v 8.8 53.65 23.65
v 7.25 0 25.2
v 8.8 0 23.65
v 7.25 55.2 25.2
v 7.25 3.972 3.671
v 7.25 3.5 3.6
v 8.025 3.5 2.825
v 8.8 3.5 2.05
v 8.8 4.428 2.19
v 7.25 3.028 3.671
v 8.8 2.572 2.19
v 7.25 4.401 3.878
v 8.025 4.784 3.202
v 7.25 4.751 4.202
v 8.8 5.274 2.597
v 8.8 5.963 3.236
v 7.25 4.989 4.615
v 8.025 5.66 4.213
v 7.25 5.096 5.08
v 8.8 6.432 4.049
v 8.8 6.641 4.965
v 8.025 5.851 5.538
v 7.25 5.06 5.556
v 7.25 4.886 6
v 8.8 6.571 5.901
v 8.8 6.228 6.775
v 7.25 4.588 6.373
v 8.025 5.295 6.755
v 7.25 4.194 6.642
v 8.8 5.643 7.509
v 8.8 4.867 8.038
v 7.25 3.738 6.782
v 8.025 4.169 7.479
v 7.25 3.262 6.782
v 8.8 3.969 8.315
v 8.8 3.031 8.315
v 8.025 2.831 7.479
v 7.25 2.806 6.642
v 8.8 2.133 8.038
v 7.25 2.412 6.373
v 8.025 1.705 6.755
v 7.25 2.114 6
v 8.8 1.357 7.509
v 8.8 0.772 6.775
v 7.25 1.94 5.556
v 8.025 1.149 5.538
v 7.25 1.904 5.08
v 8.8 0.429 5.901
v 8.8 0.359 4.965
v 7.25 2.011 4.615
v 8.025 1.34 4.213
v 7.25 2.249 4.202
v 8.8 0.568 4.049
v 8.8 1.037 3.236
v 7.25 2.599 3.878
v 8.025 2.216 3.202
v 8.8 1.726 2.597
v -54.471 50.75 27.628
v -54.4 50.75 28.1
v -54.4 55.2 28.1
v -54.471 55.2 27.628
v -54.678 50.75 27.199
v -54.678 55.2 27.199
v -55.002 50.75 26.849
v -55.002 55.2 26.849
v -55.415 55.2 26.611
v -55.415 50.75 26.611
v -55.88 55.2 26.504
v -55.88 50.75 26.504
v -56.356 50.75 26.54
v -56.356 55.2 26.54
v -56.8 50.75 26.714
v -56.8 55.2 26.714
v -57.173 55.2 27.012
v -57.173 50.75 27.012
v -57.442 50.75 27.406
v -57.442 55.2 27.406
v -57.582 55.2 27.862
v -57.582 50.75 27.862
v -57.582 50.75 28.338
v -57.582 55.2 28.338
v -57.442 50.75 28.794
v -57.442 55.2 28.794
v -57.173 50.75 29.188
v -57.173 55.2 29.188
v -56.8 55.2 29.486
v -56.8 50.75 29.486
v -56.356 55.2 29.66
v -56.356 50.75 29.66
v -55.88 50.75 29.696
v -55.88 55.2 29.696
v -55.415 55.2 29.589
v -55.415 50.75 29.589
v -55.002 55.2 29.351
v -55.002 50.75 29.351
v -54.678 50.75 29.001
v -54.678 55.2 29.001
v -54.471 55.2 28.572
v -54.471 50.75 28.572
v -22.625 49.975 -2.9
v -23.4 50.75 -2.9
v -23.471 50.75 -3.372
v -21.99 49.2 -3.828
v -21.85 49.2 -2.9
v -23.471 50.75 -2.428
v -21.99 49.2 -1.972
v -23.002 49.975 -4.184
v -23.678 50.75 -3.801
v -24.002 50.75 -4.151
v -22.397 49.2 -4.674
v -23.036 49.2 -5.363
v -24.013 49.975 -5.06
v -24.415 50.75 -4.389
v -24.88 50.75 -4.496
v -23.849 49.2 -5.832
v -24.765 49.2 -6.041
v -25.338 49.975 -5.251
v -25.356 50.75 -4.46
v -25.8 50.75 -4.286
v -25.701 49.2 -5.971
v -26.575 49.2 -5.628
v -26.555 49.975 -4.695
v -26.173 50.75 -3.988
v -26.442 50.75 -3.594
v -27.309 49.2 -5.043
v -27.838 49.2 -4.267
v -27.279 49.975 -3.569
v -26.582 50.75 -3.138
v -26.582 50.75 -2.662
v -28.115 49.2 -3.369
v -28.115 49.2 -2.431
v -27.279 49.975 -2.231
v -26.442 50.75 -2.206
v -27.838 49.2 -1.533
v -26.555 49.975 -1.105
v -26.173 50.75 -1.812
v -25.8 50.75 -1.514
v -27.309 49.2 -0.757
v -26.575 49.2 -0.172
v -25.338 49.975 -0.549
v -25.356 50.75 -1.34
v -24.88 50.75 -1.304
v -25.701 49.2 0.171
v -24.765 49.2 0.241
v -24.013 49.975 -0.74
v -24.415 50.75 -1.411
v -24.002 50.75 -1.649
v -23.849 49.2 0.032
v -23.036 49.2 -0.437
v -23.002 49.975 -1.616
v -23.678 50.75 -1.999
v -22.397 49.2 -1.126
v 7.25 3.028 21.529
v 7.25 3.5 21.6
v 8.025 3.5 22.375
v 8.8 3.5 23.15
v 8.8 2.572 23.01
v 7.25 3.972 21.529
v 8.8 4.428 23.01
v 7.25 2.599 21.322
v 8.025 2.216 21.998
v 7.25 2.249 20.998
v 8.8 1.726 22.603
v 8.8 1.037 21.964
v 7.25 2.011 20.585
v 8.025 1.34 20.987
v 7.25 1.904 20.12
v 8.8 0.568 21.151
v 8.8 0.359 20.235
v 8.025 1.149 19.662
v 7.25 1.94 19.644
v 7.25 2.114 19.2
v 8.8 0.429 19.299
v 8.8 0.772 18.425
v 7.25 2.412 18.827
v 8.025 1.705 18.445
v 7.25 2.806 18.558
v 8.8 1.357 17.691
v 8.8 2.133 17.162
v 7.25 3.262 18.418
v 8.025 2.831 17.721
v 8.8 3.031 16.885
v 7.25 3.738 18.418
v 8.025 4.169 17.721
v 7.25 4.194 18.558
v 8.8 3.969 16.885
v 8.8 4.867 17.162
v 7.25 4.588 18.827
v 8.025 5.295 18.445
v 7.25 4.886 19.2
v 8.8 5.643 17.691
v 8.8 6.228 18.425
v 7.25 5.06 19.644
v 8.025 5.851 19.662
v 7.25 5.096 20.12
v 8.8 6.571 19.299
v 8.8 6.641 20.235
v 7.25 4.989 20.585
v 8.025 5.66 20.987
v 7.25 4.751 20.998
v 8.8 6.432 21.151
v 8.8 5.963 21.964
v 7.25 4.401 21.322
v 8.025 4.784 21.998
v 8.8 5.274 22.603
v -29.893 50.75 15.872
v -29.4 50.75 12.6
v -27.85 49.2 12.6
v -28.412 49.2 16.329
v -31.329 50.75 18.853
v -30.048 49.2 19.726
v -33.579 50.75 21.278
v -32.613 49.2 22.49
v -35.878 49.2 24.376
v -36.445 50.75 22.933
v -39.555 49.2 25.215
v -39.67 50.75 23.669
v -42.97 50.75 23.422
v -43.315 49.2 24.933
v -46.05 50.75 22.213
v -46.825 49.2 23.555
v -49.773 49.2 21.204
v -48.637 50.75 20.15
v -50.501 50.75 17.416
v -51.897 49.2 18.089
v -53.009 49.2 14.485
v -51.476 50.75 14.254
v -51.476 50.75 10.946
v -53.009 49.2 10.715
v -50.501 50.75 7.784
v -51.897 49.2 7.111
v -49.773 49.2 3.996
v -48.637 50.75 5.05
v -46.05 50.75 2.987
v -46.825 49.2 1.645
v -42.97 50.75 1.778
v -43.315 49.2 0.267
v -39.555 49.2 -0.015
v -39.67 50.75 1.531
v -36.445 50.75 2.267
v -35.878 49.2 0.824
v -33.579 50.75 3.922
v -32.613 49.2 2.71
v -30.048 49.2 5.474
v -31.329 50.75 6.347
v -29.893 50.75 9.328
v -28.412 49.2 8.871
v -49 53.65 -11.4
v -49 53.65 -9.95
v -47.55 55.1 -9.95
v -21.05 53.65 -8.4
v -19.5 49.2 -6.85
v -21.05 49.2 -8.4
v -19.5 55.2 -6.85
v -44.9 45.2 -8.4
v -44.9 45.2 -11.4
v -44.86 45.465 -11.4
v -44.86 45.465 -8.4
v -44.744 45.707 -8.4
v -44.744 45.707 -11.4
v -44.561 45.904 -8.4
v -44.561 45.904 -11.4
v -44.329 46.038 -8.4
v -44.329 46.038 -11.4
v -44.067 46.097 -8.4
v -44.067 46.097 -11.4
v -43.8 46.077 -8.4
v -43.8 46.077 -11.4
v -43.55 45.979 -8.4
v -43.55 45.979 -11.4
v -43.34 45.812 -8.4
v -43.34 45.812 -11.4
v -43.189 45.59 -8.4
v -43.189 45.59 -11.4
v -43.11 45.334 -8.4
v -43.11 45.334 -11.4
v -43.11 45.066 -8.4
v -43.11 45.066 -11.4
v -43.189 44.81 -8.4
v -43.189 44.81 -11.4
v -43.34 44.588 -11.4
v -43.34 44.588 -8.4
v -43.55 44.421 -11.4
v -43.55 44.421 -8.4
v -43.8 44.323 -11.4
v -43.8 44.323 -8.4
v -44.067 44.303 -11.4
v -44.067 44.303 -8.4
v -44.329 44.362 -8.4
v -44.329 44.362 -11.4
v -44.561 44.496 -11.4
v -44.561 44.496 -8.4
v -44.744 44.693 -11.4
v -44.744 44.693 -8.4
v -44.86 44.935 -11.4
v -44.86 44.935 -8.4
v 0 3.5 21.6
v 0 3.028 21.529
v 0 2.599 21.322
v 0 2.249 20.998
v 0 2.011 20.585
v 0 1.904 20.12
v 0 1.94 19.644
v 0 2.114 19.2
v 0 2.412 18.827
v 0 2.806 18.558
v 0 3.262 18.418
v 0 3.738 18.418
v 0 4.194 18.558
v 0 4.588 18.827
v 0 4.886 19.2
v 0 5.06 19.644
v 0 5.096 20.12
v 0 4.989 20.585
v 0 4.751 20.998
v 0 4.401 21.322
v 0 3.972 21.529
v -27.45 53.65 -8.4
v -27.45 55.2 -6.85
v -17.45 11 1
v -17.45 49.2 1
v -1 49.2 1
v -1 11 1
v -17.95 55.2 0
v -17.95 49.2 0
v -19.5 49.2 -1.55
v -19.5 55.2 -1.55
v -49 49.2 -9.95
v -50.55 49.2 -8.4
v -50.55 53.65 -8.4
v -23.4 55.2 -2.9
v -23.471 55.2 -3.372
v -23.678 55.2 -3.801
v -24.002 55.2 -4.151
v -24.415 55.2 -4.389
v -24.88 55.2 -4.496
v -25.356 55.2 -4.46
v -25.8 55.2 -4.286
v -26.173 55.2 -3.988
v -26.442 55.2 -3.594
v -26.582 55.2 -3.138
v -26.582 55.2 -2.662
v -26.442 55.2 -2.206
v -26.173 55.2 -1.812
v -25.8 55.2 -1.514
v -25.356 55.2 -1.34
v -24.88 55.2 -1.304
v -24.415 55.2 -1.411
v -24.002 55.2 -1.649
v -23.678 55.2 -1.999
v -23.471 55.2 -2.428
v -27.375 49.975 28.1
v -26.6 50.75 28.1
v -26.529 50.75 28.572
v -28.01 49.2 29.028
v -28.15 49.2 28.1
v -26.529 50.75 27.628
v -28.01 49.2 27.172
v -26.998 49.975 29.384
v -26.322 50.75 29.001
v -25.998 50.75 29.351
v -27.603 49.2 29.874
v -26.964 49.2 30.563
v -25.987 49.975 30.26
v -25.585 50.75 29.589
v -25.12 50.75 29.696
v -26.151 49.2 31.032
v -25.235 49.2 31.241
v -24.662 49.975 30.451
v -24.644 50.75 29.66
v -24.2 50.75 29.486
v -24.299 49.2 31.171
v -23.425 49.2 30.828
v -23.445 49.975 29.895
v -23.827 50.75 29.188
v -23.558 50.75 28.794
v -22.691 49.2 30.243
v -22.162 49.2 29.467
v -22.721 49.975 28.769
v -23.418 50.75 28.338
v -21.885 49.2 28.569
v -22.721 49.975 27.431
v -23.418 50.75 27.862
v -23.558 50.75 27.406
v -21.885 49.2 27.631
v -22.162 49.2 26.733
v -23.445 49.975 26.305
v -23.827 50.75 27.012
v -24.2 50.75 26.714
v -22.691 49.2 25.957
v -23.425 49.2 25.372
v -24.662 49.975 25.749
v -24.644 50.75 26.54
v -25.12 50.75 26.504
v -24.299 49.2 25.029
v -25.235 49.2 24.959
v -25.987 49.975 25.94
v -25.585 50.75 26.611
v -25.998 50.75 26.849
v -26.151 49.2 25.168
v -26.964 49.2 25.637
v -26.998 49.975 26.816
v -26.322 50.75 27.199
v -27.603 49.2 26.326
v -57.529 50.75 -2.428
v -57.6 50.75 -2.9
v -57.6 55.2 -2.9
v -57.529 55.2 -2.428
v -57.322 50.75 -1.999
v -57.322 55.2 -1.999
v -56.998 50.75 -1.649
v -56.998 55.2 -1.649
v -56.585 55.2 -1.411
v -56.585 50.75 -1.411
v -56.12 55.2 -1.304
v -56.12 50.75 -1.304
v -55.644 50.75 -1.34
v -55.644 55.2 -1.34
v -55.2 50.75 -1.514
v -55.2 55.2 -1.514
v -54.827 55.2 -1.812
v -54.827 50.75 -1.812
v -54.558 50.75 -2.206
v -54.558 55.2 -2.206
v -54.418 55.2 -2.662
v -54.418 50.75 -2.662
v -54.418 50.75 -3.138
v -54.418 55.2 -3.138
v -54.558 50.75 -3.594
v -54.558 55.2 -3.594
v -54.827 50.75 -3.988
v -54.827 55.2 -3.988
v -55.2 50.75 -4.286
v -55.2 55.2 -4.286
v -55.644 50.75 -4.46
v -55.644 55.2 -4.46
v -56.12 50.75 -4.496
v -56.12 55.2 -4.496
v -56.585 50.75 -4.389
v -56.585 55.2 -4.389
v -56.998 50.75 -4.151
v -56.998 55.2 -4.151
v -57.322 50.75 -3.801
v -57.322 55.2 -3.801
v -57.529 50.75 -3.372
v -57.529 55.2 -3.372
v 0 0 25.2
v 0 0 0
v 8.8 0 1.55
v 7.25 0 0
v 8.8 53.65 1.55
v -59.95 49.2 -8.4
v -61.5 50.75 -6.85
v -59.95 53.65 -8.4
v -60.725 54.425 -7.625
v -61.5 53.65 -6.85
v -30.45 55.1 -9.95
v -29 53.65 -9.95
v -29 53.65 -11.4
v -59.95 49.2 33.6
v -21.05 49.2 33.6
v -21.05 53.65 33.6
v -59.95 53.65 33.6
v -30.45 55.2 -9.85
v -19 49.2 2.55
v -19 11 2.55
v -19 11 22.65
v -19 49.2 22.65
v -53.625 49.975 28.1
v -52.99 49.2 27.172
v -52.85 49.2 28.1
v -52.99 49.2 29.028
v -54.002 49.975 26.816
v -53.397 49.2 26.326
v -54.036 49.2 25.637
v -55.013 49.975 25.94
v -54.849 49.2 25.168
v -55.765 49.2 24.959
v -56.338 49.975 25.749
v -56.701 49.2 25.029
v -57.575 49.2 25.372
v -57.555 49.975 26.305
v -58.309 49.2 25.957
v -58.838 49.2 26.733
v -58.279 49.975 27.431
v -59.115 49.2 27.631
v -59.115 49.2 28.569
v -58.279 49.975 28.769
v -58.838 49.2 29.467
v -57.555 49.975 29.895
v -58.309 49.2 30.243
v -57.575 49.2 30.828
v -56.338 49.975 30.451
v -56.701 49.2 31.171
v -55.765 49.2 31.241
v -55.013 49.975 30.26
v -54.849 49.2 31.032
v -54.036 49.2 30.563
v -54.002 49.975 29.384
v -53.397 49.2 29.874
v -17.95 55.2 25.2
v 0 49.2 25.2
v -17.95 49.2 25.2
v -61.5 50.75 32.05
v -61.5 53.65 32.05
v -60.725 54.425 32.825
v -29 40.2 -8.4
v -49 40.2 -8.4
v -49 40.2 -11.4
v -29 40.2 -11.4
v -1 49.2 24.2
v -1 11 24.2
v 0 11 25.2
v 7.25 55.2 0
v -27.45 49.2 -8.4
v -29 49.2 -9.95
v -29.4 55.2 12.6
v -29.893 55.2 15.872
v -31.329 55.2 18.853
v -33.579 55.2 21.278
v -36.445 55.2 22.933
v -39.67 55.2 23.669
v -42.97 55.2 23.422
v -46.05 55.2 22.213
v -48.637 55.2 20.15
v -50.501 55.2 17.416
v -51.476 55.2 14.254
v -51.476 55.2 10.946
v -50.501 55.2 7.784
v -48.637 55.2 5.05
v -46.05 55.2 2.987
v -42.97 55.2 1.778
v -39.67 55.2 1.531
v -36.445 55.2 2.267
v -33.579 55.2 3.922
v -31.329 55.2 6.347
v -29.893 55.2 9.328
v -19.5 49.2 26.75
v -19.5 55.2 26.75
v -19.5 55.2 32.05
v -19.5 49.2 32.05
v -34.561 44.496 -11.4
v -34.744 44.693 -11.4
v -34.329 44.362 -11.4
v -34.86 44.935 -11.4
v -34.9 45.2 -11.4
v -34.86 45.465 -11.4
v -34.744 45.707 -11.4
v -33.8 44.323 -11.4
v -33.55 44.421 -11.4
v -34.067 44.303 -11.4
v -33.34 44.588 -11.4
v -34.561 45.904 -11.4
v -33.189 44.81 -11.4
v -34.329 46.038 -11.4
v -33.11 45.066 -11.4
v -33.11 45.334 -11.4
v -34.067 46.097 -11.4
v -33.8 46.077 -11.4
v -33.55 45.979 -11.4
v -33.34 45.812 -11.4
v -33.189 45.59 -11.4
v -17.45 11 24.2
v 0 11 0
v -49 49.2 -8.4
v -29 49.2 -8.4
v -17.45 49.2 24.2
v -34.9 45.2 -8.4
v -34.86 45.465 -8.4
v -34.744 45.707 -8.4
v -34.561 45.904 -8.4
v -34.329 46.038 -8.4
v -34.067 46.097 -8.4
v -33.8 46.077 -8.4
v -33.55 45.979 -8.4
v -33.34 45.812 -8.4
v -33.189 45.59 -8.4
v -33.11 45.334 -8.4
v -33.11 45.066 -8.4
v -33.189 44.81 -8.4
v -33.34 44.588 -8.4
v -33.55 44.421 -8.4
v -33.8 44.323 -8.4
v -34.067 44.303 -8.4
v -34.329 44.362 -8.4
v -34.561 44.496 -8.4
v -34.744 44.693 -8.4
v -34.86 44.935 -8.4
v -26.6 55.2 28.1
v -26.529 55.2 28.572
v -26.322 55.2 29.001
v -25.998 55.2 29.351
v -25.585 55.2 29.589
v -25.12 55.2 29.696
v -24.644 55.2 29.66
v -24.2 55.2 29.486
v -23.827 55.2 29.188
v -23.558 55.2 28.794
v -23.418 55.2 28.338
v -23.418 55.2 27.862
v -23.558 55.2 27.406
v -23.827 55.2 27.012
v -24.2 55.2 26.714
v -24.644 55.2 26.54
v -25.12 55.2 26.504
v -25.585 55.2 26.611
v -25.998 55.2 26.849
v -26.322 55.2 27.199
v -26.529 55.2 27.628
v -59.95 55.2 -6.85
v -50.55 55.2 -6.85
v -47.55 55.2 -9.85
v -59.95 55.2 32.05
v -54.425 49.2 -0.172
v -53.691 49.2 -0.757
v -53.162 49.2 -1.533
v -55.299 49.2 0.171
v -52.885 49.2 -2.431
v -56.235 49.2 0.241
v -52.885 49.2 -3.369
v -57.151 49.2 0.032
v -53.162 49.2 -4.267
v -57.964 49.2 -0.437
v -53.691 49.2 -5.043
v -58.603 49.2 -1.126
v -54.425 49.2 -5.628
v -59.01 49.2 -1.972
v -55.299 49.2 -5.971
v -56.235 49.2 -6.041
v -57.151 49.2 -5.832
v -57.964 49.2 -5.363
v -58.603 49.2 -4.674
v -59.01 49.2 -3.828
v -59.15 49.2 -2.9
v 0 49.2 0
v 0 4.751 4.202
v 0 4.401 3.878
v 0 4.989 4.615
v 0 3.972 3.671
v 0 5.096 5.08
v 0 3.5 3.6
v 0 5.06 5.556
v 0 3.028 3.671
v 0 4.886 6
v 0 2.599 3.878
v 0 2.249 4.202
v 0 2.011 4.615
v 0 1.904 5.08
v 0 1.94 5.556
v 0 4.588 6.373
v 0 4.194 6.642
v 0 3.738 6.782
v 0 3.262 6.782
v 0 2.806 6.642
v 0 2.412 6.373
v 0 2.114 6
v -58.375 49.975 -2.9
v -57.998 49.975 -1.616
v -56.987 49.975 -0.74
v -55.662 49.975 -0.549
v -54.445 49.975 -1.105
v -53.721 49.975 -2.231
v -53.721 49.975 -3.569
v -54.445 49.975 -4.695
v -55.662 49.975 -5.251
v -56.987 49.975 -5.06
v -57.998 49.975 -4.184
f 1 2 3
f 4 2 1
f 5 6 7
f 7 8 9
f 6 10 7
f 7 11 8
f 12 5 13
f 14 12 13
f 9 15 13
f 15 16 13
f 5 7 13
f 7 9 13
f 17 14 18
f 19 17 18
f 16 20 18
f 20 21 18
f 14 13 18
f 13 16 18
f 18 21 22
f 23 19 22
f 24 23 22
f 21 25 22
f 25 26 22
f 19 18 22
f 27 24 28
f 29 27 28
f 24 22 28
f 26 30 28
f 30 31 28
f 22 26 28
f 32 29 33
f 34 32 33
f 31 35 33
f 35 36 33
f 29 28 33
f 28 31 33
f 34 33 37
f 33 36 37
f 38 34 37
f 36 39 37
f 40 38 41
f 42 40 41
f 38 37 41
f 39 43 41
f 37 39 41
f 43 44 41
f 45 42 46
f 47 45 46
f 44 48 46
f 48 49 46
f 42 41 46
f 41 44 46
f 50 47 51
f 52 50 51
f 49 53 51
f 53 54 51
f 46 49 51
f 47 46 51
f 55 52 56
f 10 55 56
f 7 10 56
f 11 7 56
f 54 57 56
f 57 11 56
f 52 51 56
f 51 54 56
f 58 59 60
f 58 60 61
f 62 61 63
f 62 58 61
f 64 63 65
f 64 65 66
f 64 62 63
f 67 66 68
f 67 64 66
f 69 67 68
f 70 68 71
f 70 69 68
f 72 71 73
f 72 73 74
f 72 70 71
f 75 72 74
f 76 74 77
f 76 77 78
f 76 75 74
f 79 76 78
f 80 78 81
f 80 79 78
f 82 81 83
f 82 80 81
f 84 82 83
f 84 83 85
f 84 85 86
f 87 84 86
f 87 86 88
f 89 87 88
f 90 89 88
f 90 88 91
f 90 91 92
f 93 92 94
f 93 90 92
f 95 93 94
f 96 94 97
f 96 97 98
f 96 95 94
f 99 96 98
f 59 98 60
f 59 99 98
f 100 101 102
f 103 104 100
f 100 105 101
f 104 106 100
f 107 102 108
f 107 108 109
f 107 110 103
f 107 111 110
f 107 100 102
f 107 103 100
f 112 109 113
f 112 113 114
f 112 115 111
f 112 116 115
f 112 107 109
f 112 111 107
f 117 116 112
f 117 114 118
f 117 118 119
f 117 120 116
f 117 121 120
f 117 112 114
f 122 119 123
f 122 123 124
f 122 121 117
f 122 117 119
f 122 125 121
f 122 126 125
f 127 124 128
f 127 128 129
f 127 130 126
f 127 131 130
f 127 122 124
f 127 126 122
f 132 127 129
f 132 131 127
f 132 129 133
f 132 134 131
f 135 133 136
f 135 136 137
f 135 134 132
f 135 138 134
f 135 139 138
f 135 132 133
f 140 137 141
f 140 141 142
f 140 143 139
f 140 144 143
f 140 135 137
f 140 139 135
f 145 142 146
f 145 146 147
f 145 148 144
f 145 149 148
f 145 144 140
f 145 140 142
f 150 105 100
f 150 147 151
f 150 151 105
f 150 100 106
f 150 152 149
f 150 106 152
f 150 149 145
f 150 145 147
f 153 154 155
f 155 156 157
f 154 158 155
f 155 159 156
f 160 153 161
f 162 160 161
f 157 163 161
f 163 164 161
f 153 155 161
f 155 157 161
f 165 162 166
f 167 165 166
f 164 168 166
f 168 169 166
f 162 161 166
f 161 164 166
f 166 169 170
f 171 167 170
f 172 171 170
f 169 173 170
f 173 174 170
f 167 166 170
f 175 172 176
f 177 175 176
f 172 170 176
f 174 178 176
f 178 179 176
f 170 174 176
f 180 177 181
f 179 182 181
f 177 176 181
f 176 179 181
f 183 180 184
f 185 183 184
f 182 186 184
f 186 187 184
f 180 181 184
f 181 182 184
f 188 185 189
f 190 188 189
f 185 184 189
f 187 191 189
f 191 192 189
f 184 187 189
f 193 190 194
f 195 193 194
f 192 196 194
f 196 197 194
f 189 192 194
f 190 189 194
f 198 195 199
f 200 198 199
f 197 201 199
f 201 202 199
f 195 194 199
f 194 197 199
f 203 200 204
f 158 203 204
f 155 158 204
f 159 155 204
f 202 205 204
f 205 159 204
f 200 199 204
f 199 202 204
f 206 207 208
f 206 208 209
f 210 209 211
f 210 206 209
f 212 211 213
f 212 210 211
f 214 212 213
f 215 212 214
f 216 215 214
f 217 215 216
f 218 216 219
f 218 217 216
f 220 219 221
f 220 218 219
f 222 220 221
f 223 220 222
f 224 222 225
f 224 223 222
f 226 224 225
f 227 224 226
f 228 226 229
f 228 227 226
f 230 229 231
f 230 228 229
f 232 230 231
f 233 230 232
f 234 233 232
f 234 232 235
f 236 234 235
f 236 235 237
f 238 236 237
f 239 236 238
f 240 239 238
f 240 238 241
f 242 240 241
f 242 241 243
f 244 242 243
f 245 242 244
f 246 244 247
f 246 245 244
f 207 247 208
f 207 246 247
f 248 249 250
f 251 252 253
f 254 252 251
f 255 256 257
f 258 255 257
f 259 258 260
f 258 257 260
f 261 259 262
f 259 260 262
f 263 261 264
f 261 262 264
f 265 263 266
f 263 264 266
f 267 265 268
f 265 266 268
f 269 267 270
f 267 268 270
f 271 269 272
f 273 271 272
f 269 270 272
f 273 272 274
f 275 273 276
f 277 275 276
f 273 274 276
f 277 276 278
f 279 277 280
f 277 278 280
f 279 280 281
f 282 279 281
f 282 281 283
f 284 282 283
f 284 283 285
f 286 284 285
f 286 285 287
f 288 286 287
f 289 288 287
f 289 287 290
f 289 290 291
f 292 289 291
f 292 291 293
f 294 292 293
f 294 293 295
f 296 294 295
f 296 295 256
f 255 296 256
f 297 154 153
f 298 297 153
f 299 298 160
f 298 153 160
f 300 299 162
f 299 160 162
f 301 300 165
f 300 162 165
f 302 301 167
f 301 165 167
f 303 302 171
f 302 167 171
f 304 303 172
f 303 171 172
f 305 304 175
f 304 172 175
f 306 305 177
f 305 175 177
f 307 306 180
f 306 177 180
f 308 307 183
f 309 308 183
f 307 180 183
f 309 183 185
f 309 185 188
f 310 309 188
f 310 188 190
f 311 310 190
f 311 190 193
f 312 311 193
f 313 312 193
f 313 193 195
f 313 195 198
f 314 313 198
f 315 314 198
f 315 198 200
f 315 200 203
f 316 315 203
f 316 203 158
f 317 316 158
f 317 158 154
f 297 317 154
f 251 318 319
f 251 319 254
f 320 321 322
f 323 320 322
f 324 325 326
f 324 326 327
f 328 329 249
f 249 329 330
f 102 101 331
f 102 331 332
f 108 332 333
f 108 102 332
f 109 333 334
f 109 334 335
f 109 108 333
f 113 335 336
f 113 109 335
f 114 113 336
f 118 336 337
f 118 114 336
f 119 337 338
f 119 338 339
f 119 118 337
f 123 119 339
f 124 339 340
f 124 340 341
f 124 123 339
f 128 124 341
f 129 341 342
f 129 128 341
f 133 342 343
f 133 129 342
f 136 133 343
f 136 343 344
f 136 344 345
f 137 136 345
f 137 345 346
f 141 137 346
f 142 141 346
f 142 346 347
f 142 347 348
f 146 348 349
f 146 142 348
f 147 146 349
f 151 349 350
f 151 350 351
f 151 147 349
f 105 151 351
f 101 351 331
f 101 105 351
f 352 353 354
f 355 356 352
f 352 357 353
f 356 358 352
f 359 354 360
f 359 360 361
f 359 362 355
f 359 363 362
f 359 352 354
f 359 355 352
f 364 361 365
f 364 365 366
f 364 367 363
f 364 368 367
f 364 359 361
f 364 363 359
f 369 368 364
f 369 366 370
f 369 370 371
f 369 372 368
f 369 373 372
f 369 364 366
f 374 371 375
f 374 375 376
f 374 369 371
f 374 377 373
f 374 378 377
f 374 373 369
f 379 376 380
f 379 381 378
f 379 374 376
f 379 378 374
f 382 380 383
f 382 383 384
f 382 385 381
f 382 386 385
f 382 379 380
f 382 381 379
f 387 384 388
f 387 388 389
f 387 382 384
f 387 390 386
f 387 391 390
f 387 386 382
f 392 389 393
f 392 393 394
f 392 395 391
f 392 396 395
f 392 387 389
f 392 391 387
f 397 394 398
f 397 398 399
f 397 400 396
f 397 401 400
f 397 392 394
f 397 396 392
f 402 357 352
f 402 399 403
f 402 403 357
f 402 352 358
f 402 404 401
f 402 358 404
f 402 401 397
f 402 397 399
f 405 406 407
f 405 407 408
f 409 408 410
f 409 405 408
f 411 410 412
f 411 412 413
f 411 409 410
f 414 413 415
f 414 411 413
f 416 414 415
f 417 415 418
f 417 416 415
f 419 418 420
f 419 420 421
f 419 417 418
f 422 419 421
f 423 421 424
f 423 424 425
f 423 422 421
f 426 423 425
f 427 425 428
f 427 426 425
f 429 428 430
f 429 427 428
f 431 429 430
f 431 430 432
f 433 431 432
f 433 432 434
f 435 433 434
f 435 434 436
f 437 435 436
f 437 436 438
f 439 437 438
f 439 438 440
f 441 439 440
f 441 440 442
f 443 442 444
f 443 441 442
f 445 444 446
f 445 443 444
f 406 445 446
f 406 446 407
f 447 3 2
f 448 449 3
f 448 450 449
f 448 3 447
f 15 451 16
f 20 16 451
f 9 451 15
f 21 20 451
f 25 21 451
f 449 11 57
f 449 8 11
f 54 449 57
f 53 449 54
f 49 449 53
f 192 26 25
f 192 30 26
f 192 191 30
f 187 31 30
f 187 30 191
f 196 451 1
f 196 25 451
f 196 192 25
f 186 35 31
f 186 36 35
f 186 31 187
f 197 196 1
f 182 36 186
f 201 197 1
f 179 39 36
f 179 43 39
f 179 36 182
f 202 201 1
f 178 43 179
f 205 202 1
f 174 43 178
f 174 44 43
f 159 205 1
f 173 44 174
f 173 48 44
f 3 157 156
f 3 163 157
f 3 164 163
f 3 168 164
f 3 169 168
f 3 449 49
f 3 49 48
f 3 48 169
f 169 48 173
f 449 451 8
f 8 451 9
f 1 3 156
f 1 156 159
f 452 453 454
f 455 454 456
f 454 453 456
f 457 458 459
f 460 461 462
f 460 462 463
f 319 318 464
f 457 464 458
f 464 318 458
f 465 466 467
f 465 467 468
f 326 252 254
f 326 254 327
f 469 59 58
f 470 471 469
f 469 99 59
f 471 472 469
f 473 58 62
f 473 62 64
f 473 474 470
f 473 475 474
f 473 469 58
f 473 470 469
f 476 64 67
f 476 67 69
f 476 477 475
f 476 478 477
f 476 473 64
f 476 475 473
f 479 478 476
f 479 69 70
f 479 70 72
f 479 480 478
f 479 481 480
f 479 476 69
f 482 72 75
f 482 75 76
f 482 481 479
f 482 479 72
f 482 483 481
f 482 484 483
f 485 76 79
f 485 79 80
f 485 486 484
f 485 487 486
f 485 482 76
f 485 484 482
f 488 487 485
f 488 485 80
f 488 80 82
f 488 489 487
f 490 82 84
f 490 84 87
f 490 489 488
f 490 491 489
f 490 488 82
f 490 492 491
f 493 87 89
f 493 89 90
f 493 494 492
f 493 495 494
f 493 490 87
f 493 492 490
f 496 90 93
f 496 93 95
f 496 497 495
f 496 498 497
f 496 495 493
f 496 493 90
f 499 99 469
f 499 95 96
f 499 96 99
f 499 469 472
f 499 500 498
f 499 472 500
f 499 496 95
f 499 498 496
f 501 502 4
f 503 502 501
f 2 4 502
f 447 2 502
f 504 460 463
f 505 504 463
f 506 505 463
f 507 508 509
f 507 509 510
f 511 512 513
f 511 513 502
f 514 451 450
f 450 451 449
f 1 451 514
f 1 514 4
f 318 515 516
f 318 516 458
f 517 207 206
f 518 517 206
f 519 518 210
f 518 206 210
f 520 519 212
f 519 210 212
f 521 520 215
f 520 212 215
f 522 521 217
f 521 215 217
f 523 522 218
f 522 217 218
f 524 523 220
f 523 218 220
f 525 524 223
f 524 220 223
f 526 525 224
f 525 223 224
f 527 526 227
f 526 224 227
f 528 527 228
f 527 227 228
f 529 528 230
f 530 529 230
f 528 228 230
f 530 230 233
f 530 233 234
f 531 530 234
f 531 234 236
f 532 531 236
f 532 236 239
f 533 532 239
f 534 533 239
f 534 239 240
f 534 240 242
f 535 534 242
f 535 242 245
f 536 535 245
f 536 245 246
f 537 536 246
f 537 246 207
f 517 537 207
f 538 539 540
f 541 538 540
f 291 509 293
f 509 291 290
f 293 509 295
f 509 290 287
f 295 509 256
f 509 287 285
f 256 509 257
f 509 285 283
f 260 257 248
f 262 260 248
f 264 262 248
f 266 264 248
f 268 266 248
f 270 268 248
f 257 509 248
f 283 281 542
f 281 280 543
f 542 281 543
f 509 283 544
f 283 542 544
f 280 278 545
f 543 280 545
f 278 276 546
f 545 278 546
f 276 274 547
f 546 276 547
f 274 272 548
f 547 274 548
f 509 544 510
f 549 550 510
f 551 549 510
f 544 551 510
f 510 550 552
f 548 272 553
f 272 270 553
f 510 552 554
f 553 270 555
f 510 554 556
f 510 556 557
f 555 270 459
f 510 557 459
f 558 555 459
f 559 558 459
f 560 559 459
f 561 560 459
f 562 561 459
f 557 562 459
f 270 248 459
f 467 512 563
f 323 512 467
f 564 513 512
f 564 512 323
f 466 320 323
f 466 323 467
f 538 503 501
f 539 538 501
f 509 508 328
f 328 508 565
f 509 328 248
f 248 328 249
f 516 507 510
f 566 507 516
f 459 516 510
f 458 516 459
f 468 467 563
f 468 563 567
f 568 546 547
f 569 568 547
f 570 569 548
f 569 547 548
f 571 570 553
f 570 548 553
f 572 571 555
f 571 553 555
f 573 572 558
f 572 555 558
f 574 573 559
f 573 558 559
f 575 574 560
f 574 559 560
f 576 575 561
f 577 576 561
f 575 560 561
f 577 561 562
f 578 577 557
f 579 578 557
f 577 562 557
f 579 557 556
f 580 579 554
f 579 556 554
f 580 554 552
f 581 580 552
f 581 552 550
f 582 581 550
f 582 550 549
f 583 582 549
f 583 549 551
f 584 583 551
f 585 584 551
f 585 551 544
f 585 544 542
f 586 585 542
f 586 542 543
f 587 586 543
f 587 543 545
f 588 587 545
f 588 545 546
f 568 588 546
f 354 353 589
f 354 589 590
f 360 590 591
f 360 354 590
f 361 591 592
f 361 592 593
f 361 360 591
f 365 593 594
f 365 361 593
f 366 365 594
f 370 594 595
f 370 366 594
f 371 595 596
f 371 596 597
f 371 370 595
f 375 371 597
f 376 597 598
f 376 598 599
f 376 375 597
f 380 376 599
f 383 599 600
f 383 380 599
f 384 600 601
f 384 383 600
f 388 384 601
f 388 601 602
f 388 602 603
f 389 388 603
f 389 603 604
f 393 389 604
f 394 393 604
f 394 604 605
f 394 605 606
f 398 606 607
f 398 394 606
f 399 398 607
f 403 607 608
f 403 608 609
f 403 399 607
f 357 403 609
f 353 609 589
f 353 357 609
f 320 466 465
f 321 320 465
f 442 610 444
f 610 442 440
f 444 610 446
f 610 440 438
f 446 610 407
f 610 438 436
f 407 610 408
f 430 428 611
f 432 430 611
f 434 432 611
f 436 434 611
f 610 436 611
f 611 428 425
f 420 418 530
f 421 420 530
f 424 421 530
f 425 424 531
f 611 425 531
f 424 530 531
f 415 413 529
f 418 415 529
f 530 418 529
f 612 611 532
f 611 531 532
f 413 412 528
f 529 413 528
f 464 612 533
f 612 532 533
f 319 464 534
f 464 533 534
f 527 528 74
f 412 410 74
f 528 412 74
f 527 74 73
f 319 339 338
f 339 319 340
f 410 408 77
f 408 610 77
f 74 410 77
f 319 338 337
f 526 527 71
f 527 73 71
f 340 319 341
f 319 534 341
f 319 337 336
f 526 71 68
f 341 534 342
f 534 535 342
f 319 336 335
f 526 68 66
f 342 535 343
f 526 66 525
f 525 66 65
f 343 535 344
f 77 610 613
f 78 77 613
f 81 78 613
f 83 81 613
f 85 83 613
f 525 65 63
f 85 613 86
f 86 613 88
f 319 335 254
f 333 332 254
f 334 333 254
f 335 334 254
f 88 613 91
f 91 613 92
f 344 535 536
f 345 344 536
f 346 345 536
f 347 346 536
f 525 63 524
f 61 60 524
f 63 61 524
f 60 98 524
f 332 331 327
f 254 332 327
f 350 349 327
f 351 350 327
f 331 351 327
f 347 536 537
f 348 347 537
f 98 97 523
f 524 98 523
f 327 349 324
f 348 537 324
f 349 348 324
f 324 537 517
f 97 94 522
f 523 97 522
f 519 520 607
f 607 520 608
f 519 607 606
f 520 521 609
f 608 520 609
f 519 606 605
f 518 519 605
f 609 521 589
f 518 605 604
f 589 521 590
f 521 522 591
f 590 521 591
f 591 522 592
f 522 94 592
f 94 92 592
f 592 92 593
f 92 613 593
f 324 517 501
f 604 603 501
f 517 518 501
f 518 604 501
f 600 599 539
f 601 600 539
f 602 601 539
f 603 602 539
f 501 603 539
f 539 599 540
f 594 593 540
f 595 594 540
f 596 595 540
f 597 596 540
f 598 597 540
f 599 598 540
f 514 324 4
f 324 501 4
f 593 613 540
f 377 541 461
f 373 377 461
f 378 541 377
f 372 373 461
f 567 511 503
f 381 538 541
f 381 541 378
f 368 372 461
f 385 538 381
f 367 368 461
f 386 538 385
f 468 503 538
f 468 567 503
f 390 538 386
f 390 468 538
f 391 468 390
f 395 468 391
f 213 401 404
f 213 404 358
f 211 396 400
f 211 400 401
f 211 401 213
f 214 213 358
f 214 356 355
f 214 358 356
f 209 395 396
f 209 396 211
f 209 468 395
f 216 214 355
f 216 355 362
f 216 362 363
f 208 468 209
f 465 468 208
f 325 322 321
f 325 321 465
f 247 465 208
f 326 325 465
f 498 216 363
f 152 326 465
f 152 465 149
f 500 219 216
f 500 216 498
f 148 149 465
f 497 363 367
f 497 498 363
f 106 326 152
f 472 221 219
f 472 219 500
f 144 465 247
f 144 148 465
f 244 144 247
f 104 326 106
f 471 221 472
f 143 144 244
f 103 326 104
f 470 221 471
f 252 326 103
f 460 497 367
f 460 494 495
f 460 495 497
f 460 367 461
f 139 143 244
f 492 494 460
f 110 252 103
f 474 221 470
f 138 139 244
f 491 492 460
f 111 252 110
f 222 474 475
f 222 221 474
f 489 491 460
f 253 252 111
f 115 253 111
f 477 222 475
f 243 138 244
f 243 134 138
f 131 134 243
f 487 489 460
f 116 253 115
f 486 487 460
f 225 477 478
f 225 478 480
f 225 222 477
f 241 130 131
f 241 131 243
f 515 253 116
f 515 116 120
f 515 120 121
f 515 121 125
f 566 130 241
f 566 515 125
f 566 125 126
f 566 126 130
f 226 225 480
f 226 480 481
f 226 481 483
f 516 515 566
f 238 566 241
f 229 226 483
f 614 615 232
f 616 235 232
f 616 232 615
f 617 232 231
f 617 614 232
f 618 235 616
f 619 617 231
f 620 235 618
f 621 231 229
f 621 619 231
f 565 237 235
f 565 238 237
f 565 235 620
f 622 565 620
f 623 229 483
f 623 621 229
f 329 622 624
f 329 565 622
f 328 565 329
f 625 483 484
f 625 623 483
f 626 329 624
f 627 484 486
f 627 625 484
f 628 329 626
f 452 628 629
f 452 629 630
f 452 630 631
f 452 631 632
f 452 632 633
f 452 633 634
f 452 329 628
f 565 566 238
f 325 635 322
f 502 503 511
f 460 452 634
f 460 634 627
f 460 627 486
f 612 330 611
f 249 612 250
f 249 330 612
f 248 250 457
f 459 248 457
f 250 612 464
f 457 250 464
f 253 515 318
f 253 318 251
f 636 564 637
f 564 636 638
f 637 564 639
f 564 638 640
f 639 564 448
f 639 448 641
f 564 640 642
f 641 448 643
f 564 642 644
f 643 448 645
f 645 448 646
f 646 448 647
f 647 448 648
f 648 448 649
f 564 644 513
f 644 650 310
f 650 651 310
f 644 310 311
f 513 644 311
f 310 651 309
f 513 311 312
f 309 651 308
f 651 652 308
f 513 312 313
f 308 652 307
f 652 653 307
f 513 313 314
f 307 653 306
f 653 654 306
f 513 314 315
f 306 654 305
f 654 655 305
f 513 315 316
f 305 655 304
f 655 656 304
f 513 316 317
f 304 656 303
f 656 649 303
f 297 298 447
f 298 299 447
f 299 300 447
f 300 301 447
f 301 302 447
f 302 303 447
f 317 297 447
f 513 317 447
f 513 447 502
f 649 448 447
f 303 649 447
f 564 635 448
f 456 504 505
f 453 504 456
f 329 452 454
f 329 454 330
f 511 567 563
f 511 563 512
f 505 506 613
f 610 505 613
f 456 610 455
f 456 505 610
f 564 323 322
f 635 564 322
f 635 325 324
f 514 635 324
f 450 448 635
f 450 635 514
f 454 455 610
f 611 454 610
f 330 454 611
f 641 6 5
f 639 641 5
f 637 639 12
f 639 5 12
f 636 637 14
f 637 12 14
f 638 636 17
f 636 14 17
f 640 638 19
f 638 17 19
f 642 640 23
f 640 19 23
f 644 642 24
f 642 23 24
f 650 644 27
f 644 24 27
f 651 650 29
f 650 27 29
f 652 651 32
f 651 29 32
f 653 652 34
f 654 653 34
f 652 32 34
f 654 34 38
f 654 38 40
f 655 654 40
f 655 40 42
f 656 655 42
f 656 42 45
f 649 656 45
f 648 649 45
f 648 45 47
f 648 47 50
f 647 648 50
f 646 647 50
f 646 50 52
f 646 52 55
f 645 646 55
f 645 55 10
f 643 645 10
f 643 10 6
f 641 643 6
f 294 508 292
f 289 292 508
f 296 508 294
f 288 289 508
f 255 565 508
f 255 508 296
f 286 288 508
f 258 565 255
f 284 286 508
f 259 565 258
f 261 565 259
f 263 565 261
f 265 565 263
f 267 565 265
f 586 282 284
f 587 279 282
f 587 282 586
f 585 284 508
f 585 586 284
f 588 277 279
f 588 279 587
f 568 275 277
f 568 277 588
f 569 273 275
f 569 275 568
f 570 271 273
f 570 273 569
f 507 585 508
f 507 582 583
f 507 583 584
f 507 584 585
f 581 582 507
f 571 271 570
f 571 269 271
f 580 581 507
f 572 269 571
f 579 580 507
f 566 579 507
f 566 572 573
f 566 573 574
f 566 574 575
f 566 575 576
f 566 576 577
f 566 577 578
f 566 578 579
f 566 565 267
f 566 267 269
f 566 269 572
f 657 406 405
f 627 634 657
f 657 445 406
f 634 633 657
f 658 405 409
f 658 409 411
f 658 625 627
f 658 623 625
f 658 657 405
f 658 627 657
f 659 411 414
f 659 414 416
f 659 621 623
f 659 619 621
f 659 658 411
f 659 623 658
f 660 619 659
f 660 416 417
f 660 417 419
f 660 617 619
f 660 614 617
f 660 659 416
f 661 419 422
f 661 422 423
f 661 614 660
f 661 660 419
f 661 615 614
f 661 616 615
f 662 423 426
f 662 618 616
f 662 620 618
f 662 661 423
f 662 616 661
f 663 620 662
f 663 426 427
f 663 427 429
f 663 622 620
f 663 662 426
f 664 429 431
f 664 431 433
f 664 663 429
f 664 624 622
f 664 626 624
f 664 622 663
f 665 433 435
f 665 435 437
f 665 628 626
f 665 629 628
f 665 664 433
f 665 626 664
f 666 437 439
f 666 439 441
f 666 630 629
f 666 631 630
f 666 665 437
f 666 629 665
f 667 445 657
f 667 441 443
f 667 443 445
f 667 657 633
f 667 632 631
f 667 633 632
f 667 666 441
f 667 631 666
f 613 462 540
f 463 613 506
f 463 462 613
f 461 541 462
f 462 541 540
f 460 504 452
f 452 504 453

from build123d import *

# Parameters (mm, degrees)
BOSS_EXTRUDE1_DEPTH = 25.2
SKETCH2_R           = 1.6
BOSS_EXTRUDE2_DEPTH = 6
SKETCH3_W           = 19
SKETCH3_H           = 1
CUT_EXTRUDE1_DEPTH  = 38.2
CHAMFER2_SIZE       = 1.55
SKETCH4_R           = 11.1
CUT_EXTRUDE2_DEPTH  = 86.626222619
CHAMFER3_SIZE       = 1.55
CHAMFER4_SIZE       = 1
SKETCH5_R           = 1.6
CUT_EXTRUDE3_DEPTH  = 96.48869043
CHAMFER5_SIZE       = 1.55
BOSS_EXTRUDE3_START = -42
SKETCH6_W           = 20
SKETCH6_H           = 15
BOSS_EXTRUDE3_DEPTH = 3
SKETCH7_R           = 0.9
CUT_EXTRUDE4_DEPTH  = 95.097236941
CHAMFER7_SIZE       = 1.55
CHAMFER8_SIZE       = 1.55


with BuildPart() as part:
    # Sketch1 → Boss-Extrude1 (new body)
    with BuildSketch(Plane.XY):
        Polygon((0, 0), (0, 11), (-19, 11), (-19, 49.2), (8.8, 49.2), (8.8, 0), align=None)
    extrude(amount=BOSS_EXTRUDE1_DEPTH)

    # Sketch2 → Boss-Extrude2 (add)
    with BuildSketch(Plane(origin=(0, 49.2, 0), x_dir=(1, 0, 0), z_dir=(0, 1, 0))):
        Polygon((-61.5, 8.4), (-19.5, 8.4), (-19.5, 0), (8.8, 0), (8.8, -25.2), (-19.5, -25.2), (-19.5, -33.6), (-61.5, -33.6), align=None)
        with Locations(Location((-56, 2.9, 0), (0, 0, 180))):
            Circle(SKETCH2_R, mode=Mode.SUBTRACT)
        with Locations((-56, -28.1)):
            Circle(SKETCH2_R, mode=Mode.SUBTRACT)
        with Locations(Location((-25, -28.1, 0), (0, 0, 180))):
            Circle(SKETCH2_R, mode=Mode.SUBTRACT)
        with Locations((-25, 2.9)):
            Circle(SKETCH2_R, mode=Mode.SUBTRACT)
    extrude(amount=BOSS_EXTRUDE2_DEPTH)

    # Sketch3 → Cut-Extrude1 (cut)
    with BuildSketch(Plane.XZ.offset(-11)):
        with Locations((-9.5, 24.7)):
            Rectangle(SKETCH3_W, SKETCH3_H)
        with Locations((-9.5, 0.5)):
            Rectangle(SKETCH3_W, SKETCH3_H)
    extrude(amount=-CUT_EXTRUDE1_DEPTH, mode=Mode.SUBTRACT)

    # Chamfer2
    chamfer2_edges = [part.edges().sort_by_distance(p)[0] for p in [
        (-54.4, 49.2, -2.9),
        (-57.6, 49.2, 28.1),
        (-23.4, 49.2, 28.1),
        (-26.6, 49.2, -2.9),
    ]]
    chamfer(chamfer2_edges, length=CHAMFER2_SIZE)

    # Sketch4 → Cut-Extrude2 (cut, through all)
    with BuildSketch(Plane.XZ.offset(-49.2)):
        with Locations((-40.5, 12.6)):
            Circle(SKETCH4_R)
    extrude(amount=-CUT_EXTRUDE2_DEPTH, mode=Mode.SUBTRACT)

    # Chamfer3
    chamfer3_edges = [part.edges().sort_by_distance(p)[0] for p in [
        (8.8, 55.2, 12.6),
        (-61.5, 55.2, 12.6),
        (-19.5, 52.2, 0),
        (-19.5, 52.2, -8.4),
        (-61.5, 49.2, 12.6),
        (-61.5, 52.2, -8.4),
        (-61.5, 52.2, 33.6),
        (-19.5, 52.2, 33.6),
        (-19.5, 52.2, 25.2),
        (8.8, 27.6, 25.2),
        (-19, 30.1, 24.2),
        (-19, 30.1, 1),
        (8.8, 27.6, 0),
        (-51.6, 49.2, 12.6),
    ]]
    chamfer(chamfer3_edges, length=CHAMFER3_SIZE)

    # Chamfer4
    chamfer4_edges = [part.edges().sort_by_distance(p)[0] for p in [
        (0, 30.1, 24.2),
        (0, 30.1, 1),
    ]]
    chamfer(chamfer4_edges, length=CHAMFER4_SIZE - 0.0001)  # a hair under: the kernel refuses the full size

    # Sketch5 → Cut-Extrude3 (cut, through all)
    with BuildSketch(Plane(origin=(8.8, 0, 0), x_dir=(0, 0, -1), z_dir=(1, 0, 0))):
        with Locations((-5.2, 3.5)):
            Circle(SKETCH5_R)
        with Locations(Location((-20, 3.5, 0), (0, 0, 180))):
            Circle(SKETCH5_R)
    extrude(amount=-CUT_EXTRUDE3_DEPTH, mode=Mode.SUBTRACT)

    # Chamfer5
    chamfer5_edges = [part.edges().sort_by_distance(p)[0] for p in [
        (8.8, 3.5, 18.4),
        (8.8, 3.5, 6.8),
    ]]
    chamfer(chamfer5_edges, length=CHAMFER5_SIZE)

    # Sketch6 → Boss-Extrude3 (add)
    with BuildSketch(Plane.XY.offset(33.6).offset(BOSS_EXTRUDE3_START)):
        with Locations((-39, 47.7)):
            Rectangle(SKETCH6_W, SKETCH6_H)
    extrude(amount=-BOSS_EXTRUDE3_DEPTH)

    # Sketch7 → Cut-Extrude4 (cut, through all)
    with BuildSketch(Plane(origin=(0, 0, -11.4), x_dir=(-1, 0, 0), z_dir=(0, 0, -1))):
        with Locations((44, 45.2)):
            Circle(SKETCH7_R)
        with Locations((34, 45.2)):
            Circle(SKETCH7_R)
    extrude(amount=-CUT_EXTRUDE4_DEPTH, mode=Mode.SUBTRACT)

    # Chamfer7
    chamfer7_edges = [part.edges().sort_by_distance(p)[0] for p in [
        (-40.5, 55.2, 33.6),
        (-29, 55.2, -9.9),
        (-49, 55.2, -9.9),
        (-29, 52.2, -8.4),
        (-25.025, 55.2, -8.4),
        (-49, 52.2, -8.4),
        (-54.475, 55.2, -8.4),
    ]]
    chamfer(chamfer7_edges, length=CHAMFER7_SIZE)

    # Chamfer8
    chamfer8_edges = [part.edges().sort_by_distance(p)[0] for p in [
        (-39, 55.2, -11.4),
    ]]
    chamfer(chamfer8_edges, length=CHAMFER8_SIZE)


solid = part.part
